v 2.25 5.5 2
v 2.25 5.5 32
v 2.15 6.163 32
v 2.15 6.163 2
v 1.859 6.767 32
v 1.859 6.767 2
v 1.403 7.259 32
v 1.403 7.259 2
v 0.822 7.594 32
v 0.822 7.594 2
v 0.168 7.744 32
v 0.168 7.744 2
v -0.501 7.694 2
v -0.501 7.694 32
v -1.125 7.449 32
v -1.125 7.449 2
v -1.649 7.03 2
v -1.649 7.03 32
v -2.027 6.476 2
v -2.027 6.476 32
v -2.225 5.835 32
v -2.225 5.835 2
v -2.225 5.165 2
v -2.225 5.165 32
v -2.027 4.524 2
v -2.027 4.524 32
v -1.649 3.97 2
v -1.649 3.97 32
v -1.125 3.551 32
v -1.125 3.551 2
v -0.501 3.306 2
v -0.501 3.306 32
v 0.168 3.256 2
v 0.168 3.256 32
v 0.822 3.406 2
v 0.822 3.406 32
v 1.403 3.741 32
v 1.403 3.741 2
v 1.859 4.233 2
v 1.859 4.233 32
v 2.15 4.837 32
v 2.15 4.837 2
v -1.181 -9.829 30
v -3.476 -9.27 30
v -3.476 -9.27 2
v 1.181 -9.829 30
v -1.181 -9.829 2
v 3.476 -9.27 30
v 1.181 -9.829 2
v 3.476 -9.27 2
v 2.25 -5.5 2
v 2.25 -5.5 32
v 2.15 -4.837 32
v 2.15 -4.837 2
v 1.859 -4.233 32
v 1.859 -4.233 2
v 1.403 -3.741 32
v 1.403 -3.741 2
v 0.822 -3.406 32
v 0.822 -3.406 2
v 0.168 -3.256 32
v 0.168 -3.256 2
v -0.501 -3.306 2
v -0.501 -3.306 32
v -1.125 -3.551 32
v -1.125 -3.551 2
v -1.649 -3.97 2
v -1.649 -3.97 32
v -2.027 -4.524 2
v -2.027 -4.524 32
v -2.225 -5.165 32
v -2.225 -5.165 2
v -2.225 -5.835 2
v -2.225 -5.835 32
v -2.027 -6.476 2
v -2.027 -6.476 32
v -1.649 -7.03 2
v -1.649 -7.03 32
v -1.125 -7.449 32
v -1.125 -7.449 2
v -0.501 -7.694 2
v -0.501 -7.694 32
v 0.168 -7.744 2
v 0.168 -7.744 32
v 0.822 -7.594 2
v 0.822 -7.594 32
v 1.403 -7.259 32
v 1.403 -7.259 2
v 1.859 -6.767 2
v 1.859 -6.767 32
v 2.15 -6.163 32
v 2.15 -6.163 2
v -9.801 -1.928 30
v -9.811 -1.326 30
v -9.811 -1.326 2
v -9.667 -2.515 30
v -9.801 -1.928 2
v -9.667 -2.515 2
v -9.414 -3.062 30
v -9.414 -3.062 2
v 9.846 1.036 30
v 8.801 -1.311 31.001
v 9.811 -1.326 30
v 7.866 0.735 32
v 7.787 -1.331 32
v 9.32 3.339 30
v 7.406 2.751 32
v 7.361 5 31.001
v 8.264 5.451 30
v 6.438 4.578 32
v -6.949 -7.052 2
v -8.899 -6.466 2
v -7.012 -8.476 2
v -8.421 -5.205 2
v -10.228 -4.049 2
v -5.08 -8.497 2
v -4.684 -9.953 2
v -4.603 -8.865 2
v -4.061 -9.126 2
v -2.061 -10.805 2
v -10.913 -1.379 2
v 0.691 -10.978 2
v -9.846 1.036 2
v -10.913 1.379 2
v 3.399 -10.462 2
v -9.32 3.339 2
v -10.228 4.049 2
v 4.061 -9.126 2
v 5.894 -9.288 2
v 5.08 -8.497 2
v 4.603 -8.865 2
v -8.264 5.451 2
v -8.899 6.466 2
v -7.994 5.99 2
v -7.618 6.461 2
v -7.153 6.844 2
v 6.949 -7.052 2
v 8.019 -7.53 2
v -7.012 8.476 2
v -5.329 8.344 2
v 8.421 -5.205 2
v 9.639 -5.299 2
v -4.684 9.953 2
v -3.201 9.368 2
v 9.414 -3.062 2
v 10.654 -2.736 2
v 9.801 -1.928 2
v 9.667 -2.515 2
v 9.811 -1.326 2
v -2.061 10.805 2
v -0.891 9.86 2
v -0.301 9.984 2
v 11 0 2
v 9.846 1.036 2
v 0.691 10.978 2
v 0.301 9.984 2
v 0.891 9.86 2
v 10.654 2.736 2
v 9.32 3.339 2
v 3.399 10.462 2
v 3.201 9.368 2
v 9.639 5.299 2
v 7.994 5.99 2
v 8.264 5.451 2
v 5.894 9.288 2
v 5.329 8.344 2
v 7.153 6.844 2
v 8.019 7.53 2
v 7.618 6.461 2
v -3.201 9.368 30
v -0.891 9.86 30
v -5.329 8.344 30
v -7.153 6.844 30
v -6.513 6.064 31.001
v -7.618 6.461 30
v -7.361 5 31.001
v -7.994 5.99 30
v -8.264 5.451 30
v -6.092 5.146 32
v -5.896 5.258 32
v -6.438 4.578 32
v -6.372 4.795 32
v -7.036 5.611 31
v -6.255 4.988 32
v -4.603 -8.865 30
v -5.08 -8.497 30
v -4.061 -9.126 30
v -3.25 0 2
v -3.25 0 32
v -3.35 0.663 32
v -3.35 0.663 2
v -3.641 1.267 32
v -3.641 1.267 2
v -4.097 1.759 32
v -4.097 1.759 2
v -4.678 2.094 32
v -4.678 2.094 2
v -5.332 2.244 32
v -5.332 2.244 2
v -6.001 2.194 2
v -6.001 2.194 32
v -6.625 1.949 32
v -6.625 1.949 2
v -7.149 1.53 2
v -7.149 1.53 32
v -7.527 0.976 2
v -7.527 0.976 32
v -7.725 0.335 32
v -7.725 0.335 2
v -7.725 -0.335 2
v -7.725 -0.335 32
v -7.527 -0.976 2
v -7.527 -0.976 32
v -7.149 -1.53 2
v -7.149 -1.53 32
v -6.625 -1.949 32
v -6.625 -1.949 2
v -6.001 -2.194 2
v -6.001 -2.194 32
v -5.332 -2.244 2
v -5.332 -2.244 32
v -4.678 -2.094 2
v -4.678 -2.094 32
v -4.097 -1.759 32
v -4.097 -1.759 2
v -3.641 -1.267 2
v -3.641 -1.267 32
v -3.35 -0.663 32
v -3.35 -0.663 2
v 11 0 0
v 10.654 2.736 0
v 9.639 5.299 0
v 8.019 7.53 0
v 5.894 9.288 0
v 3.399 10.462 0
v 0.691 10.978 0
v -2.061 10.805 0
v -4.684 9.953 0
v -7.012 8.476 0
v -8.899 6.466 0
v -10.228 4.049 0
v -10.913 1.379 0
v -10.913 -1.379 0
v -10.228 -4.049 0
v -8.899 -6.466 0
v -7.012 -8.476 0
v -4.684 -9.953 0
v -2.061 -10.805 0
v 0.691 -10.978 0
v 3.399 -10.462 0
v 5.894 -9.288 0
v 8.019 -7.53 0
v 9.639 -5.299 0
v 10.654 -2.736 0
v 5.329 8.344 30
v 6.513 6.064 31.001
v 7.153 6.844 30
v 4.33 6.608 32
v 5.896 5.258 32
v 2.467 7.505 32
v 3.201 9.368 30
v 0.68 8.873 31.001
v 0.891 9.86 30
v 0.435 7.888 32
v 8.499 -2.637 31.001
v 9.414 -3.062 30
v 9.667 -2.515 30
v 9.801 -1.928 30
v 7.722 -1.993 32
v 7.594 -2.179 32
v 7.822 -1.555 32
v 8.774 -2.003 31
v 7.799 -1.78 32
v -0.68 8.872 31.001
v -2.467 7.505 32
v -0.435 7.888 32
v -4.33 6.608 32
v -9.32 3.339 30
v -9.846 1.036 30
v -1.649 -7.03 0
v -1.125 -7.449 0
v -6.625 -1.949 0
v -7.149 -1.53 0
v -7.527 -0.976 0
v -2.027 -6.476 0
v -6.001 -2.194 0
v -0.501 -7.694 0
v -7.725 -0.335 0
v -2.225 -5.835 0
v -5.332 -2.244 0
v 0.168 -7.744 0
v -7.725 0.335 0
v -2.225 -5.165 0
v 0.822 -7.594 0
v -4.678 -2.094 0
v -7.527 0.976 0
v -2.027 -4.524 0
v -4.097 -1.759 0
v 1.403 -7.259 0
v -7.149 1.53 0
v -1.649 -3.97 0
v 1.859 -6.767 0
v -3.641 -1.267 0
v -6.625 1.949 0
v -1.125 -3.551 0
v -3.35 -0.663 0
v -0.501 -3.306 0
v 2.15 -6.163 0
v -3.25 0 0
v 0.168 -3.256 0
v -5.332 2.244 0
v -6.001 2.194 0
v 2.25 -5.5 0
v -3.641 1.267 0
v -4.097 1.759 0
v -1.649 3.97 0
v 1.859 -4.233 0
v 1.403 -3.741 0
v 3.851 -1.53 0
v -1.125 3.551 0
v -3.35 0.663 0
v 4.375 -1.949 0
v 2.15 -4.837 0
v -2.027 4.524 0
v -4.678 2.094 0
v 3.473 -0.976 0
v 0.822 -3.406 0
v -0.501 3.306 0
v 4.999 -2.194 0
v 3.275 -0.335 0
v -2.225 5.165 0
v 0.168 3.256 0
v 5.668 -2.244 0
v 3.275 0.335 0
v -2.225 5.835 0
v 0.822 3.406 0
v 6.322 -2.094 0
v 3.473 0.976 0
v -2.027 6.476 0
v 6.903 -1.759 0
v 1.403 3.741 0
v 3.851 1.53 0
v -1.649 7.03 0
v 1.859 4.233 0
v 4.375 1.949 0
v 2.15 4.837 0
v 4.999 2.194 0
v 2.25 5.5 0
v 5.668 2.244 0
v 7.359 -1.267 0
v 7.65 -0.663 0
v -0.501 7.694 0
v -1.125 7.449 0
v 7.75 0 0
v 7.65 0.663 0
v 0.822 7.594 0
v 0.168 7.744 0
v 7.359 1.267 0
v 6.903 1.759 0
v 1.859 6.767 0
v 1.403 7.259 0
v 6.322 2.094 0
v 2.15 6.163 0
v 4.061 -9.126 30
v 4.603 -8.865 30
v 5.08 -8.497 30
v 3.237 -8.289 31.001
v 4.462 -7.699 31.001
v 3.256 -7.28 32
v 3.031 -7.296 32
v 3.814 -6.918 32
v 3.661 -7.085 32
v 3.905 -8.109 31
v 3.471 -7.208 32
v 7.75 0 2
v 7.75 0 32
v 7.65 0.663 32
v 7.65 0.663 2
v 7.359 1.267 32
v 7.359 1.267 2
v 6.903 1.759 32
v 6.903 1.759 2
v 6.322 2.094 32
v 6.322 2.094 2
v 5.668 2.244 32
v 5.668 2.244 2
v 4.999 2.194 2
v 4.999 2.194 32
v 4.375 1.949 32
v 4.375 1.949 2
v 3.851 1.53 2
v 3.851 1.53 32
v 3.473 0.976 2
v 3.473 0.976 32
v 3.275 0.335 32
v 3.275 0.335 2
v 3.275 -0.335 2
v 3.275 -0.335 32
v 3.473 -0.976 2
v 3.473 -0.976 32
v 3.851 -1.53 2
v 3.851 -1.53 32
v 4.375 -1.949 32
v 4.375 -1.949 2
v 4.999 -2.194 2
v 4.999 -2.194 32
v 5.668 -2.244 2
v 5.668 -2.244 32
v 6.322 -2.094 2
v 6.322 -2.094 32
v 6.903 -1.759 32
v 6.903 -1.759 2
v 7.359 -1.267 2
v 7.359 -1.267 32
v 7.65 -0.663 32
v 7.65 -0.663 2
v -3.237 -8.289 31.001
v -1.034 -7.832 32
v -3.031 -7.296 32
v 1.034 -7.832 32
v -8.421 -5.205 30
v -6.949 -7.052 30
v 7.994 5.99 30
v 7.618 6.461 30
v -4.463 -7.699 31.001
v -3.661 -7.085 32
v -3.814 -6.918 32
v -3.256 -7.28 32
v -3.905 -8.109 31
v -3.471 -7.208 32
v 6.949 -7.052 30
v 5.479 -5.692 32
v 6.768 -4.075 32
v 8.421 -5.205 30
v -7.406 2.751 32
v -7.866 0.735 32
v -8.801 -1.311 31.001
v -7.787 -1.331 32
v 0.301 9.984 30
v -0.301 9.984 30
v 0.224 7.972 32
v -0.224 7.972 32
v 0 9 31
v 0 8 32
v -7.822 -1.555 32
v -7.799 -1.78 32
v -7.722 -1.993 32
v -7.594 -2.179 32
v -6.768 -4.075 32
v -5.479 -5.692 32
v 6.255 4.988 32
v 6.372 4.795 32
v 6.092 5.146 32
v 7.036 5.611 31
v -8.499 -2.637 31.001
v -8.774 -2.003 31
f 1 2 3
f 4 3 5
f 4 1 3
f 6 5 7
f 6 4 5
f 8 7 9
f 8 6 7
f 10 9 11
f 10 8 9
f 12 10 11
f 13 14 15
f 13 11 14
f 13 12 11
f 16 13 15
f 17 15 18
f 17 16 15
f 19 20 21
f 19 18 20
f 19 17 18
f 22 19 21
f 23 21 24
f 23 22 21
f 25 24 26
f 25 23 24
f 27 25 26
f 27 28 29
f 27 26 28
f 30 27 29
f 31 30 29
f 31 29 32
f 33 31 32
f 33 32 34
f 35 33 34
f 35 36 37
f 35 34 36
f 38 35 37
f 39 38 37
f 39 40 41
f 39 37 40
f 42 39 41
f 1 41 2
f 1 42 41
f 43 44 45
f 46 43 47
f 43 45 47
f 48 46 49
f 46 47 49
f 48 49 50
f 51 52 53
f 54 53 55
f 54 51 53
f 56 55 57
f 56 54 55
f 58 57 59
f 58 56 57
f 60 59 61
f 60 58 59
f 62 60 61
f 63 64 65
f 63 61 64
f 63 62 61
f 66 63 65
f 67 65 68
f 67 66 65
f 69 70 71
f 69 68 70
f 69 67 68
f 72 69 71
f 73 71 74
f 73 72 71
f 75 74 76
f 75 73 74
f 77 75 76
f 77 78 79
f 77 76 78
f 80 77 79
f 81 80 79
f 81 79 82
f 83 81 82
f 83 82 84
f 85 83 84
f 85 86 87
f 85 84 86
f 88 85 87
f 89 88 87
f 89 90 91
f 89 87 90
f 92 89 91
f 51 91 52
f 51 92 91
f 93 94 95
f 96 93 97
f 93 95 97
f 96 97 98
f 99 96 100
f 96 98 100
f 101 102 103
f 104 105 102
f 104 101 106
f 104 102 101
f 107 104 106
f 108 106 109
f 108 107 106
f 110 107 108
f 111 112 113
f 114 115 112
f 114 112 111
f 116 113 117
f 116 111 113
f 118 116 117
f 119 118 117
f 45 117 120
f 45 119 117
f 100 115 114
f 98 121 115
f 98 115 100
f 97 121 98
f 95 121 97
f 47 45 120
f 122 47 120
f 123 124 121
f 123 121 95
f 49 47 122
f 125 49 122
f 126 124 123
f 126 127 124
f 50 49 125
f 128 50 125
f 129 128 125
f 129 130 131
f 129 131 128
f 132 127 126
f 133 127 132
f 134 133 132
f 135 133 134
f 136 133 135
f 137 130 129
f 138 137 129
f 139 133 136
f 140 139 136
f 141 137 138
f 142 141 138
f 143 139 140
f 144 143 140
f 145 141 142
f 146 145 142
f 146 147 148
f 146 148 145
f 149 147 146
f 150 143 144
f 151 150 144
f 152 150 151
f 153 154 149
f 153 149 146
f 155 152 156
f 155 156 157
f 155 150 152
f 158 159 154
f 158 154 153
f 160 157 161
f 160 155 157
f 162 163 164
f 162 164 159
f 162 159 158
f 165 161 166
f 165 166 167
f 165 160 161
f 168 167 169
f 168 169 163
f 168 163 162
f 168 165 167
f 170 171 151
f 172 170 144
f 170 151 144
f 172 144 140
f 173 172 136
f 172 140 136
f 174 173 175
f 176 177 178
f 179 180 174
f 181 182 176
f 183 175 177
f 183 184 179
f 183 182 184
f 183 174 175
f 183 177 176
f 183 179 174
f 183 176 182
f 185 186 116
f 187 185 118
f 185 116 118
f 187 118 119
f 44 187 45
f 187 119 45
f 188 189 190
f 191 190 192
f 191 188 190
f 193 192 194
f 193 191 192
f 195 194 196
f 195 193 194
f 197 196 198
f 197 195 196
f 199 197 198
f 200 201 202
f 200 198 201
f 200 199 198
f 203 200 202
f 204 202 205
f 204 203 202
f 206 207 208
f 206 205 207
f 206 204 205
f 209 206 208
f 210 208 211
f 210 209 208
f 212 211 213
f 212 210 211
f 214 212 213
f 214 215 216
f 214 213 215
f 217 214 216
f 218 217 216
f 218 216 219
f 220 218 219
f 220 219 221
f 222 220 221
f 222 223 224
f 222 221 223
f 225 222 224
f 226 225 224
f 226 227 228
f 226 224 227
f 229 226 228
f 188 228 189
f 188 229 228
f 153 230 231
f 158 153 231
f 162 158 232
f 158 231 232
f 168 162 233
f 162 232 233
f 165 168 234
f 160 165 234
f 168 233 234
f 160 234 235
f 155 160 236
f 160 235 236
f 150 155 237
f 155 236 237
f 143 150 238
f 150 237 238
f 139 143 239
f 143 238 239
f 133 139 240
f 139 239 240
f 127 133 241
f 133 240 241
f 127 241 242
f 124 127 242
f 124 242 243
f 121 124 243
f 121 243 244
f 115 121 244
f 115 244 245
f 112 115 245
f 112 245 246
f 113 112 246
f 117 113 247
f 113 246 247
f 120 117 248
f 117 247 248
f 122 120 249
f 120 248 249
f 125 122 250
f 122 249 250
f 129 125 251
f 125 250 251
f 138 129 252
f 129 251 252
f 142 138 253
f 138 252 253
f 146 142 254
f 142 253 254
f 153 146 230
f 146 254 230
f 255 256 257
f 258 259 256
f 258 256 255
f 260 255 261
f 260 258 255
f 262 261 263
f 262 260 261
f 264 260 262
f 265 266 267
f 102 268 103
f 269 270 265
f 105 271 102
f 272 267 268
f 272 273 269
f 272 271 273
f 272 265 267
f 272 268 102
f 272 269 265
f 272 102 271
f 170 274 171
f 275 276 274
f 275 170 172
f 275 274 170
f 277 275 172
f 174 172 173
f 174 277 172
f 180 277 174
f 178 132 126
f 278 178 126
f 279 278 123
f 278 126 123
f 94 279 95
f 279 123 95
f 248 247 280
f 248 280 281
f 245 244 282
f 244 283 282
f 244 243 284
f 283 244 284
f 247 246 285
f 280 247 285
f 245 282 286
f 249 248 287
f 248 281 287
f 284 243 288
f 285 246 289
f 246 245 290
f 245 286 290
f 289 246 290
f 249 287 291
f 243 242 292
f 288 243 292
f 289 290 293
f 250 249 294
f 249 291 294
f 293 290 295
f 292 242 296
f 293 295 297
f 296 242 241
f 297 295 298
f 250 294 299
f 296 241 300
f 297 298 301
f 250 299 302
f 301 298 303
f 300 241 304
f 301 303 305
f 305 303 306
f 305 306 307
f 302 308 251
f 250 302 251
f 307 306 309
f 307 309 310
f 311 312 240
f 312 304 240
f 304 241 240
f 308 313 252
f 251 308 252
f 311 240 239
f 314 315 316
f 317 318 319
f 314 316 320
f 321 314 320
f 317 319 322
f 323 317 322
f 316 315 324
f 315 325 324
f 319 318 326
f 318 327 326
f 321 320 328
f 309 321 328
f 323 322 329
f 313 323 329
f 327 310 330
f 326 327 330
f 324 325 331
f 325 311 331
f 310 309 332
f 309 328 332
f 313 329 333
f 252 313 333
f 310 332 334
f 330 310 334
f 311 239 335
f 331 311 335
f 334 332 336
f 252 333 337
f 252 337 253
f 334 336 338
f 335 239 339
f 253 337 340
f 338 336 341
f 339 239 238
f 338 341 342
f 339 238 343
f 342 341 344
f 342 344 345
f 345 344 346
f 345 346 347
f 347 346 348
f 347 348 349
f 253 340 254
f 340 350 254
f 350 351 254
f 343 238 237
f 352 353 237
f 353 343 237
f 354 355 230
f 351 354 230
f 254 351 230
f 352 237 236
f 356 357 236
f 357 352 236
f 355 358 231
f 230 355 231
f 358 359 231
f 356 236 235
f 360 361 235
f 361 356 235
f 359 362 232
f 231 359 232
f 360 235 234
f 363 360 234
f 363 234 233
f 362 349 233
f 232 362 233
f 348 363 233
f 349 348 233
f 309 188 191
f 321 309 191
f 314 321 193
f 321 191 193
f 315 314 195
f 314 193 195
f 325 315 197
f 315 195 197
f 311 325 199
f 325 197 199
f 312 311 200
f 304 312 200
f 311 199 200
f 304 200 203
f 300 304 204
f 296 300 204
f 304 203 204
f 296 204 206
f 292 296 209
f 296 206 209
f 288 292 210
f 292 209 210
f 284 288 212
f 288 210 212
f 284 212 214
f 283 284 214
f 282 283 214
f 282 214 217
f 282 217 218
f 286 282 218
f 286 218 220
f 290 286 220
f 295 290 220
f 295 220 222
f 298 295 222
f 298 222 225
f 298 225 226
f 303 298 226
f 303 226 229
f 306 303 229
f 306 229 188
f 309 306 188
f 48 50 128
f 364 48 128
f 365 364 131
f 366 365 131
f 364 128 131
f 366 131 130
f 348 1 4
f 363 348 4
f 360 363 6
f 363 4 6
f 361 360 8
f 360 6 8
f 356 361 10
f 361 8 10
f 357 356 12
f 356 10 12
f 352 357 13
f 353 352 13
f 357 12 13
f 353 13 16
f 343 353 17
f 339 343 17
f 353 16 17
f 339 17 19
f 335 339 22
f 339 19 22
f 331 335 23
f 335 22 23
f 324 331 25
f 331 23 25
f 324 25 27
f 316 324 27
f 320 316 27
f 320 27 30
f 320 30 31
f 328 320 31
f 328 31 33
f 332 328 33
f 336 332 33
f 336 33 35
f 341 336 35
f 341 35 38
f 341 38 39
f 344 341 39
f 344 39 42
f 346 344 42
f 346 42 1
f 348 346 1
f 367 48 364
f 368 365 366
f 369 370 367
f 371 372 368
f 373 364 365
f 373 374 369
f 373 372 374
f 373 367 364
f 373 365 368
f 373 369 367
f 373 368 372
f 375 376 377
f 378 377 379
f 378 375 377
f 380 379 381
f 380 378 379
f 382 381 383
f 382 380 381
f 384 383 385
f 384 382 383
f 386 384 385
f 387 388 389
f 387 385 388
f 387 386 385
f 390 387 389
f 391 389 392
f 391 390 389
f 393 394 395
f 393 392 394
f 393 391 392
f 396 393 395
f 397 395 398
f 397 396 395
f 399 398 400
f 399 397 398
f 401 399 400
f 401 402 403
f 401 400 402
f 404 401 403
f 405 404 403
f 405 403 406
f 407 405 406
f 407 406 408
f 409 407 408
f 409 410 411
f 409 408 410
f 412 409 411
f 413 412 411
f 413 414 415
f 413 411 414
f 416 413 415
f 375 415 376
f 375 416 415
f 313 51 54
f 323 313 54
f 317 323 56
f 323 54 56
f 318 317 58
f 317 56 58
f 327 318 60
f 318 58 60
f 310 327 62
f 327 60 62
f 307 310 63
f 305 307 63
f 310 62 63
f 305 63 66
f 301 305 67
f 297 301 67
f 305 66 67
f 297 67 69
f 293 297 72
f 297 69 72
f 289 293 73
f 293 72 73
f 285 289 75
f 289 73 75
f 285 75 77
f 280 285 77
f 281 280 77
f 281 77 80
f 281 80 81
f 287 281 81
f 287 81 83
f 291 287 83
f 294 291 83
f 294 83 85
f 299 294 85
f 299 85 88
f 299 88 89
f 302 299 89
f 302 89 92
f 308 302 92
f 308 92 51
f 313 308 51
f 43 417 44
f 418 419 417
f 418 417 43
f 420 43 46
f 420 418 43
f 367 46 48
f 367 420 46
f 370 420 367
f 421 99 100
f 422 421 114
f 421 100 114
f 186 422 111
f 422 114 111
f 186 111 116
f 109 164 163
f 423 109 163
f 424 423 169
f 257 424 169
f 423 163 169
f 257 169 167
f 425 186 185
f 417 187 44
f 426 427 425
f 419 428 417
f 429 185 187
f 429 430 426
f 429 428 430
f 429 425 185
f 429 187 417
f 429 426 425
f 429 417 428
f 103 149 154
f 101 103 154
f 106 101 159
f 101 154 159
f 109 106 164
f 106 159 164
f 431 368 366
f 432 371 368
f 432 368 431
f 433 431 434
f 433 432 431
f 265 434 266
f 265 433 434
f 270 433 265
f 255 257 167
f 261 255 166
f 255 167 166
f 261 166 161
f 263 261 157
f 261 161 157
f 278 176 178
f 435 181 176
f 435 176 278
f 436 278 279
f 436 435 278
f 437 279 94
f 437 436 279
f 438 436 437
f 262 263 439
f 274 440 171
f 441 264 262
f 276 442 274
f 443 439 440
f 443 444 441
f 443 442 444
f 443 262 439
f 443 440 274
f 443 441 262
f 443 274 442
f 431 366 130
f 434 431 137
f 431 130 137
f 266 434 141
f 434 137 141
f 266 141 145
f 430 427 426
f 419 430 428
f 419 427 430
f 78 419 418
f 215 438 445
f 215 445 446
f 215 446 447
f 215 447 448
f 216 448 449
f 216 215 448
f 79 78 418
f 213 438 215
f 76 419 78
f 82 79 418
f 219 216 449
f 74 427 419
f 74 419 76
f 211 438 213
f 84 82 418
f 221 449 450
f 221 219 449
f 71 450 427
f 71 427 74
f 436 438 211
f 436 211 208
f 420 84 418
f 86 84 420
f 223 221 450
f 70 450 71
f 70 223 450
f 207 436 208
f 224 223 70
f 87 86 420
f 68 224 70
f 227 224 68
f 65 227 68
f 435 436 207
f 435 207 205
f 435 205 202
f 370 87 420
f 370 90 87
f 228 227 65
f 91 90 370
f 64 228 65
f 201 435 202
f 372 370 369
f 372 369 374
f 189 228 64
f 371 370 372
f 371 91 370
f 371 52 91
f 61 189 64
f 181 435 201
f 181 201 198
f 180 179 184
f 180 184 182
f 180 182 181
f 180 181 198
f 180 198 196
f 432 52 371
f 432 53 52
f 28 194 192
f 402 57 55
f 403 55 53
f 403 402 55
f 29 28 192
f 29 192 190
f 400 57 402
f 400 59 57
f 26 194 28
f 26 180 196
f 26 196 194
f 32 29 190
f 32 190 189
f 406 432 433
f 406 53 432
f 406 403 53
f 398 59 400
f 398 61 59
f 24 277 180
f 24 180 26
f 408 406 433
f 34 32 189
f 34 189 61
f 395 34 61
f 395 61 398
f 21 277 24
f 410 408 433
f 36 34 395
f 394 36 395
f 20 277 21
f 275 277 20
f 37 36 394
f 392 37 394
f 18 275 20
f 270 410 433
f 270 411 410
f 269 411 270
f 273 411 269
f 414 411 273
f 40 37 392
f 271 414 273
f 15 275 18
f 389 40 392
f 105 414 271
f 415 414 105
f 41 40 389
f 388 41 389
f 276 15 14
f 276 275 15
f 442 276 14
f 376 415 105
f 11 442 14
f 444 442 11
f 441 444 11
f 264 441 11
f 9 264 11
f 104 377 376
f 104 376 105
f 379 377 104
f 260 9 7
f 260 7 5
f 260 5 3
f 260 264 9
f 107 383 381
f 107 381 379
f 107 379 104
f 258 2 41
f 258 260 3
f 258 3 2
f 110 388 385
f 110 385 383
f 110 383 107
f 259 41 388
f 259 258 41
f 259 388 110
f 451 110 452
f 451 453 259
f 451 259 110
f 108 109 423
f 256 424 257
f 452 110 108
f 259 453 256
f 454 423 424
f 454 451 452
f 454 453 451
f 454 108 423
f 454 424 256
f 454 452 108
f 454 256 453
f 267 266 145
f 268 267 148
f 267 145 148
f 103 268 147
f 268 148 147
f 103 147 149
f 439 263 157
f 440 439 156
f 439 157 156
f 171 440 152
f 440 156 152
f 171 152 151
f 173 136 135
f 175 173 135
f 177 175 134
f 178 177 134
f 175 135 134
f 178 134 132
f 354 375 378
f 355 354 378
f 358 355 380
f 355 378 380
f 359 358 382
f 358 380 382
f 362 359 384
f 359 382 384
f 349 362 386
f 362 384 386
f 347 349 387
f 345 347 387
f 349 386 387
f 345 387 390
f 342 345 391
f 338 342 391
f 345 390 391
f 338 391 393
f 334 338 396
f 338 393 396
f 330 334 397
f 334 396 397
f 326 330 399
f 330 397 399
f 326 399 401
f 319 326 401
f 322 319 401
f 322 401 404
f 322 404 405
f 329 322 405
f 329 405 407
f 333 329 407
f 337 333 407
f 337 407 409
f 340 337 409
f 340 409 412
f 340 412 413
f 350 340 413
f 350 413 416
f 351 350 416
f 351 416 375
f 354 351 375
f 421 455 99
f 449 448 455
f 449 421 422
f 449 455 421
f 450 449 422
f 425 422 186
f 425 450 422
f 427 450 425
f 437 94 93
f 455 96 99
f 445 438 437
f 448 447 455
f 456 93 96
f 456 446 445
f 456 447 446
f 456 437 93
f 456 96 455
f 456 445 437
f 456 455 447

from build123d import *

# Parameters (mm, degrees)
AUFSATZ_LINEAR_AUSTRAGEN1_DEPTH      = 32
SKIZZE2_R                            = 11
AUFSATZ_LINEAR_AUSTRAGEN2_DEPTH      = 2
FASE1_SIZE                           = 2
SKIZZE3_R                            = 2.25
SCHNITT_LINEAR_AUSTRAGEN1_DEPTH      = 31.0000001
SCHNITT_LINEAR_AUSTRAGEN1_DEPTH_BACK = 3


with BuildPart() as part:
    # Skizze1 → Aufsatz-Linear austragen1 (new body)
    with BuildSketch(Plane.XY):
        with BuildLine():
            ThreePointArc((9.810830179, -1.325749297), (9.651786331, 2.202957246), (8.264031498, 5.451218525))
            ThreePointArc((8.264031498, 5.451218525), (7.818314825, 6.234898019), (7.153465102, 6.843824737))
            ThreePointArc((7.153465102, 6.843824737), (4.295449017, 8.919591792), (0.8906051, 9.859859155))
            ThreePointArc((0.8906051, 9.859859155), (0, 10), (-0.8906051, 9.859859155))
            ThreePointArc((-0.8906051, 9.859859155), (-4.295449017, 8.919591792), (-7.153465102, 6.843824737))
            ThreePointArc((-7.153465102, 6.843824737), (-7.818314825, 6.234898019), (-8.264031498, 5.451218525))
            ThreePointArc((-8.264031498, 5.451218525), (-9.651786331, 2.202957246), (-9.810830179, -1.325749297))
            ThreePointArc((-9.810830179, -1.325749297), (-9.749279122, -2.22520934), (-9.414473622, -3.062300839))
            ThreePointArc((-9.414473622, -3.062300839), (-7.740131676, -6.172549038), (-5.080440026, -8.497007069))
            ThreePointArc((-5.080440026, -8.497007069), (-4.338837391, -9.009688679), (-3.475625088, -9.269845212))
            ThreePointArc((-3.475625088, -9.269845212), (0, -9.9), (3.475625088, -9.269845212))
            ThreePointArc((3.475625088, -9.269845212), (4.338837391, -9.009688679), (5.080440026, -8.497007069))
            ThreePointArc((5.080440026, -8.497007069), (7.740131676, -6.172549038), (9.414473622, -3.062300839))
            ThreePointArc((9.414473622, -3.062300839), (9.749279122, -2.22520934), (9.810830179, -1.325749297))
        make_face()
    extrude(amount=AUFSATZ_LINEAR_AUSTRAGEN1_DEPTH)

    # Skizze2 → Aufsatz-Linear austragen2 (add)
    with BuildSketch(Plane.XY):
        Circle(SKIZZE2_R)
    extrude(amount=AUFSATZ_LINEAR_AUSTRAGEN2_DEPTH)

    # Fase1
    fase1_edges = [part.edges().sort_by_distance(p)[0] for p in [
        (7.818314825, 6.234898019, 32),
        (4.295449017, 8.919591792, 32),
        (0, 10, 32),
        (-4.295449017, 8.919591792, 32),
        (-7.818314825, 6.234898019, 32),
        (-9.651786331, 2.202957246, 32),
        (-9.749279122, -2.22520934, 32),
        (-7.740131676, -6.172549038, 32),
        (-4.338837391, -9.009688679, 32),
        (0, -9.9, 32),
        (9.651786331, 2.202957246, 32),
        (4.338837391, -9.009688679, 32),
        (7.740131676, -6.172549038, 32),
        (9.749279122, -2.22520934, 32),
    ]]
    chamfer(fase1_edges, length=FASE1_SIZE)

    # Skizze3 → Schnitt-Linear austragen1 (cut, two sides)
    with BuildSketch(Plane.XY.offset(2)) as schnitt_linear_austragen1_sk:
        with Locations((0, 5.5)):
            Circle(SKIZZE3_R)
        with Locations((5.5, 0)):
            Circle(SKIZZE3_R)
        with Locations((0, -5.5)):
            Circle(SKIZZE3_R)
        with Locations((-5.5, 0)):
            Circle(SKIZZE3_R)
    extrude(amount=SCHNITT_LINEAR_AUSTRAGEN1_DEPTH, mode=Mode.SUBTRACT)
    extrude(schnitt_linear_austragen1_sk.sketch, amount=-SCHNITT_LINEAR_AUSTRAGEN1_DEPTH_BACK, mode=Mode.SUBTRACT)


solid = part.part
